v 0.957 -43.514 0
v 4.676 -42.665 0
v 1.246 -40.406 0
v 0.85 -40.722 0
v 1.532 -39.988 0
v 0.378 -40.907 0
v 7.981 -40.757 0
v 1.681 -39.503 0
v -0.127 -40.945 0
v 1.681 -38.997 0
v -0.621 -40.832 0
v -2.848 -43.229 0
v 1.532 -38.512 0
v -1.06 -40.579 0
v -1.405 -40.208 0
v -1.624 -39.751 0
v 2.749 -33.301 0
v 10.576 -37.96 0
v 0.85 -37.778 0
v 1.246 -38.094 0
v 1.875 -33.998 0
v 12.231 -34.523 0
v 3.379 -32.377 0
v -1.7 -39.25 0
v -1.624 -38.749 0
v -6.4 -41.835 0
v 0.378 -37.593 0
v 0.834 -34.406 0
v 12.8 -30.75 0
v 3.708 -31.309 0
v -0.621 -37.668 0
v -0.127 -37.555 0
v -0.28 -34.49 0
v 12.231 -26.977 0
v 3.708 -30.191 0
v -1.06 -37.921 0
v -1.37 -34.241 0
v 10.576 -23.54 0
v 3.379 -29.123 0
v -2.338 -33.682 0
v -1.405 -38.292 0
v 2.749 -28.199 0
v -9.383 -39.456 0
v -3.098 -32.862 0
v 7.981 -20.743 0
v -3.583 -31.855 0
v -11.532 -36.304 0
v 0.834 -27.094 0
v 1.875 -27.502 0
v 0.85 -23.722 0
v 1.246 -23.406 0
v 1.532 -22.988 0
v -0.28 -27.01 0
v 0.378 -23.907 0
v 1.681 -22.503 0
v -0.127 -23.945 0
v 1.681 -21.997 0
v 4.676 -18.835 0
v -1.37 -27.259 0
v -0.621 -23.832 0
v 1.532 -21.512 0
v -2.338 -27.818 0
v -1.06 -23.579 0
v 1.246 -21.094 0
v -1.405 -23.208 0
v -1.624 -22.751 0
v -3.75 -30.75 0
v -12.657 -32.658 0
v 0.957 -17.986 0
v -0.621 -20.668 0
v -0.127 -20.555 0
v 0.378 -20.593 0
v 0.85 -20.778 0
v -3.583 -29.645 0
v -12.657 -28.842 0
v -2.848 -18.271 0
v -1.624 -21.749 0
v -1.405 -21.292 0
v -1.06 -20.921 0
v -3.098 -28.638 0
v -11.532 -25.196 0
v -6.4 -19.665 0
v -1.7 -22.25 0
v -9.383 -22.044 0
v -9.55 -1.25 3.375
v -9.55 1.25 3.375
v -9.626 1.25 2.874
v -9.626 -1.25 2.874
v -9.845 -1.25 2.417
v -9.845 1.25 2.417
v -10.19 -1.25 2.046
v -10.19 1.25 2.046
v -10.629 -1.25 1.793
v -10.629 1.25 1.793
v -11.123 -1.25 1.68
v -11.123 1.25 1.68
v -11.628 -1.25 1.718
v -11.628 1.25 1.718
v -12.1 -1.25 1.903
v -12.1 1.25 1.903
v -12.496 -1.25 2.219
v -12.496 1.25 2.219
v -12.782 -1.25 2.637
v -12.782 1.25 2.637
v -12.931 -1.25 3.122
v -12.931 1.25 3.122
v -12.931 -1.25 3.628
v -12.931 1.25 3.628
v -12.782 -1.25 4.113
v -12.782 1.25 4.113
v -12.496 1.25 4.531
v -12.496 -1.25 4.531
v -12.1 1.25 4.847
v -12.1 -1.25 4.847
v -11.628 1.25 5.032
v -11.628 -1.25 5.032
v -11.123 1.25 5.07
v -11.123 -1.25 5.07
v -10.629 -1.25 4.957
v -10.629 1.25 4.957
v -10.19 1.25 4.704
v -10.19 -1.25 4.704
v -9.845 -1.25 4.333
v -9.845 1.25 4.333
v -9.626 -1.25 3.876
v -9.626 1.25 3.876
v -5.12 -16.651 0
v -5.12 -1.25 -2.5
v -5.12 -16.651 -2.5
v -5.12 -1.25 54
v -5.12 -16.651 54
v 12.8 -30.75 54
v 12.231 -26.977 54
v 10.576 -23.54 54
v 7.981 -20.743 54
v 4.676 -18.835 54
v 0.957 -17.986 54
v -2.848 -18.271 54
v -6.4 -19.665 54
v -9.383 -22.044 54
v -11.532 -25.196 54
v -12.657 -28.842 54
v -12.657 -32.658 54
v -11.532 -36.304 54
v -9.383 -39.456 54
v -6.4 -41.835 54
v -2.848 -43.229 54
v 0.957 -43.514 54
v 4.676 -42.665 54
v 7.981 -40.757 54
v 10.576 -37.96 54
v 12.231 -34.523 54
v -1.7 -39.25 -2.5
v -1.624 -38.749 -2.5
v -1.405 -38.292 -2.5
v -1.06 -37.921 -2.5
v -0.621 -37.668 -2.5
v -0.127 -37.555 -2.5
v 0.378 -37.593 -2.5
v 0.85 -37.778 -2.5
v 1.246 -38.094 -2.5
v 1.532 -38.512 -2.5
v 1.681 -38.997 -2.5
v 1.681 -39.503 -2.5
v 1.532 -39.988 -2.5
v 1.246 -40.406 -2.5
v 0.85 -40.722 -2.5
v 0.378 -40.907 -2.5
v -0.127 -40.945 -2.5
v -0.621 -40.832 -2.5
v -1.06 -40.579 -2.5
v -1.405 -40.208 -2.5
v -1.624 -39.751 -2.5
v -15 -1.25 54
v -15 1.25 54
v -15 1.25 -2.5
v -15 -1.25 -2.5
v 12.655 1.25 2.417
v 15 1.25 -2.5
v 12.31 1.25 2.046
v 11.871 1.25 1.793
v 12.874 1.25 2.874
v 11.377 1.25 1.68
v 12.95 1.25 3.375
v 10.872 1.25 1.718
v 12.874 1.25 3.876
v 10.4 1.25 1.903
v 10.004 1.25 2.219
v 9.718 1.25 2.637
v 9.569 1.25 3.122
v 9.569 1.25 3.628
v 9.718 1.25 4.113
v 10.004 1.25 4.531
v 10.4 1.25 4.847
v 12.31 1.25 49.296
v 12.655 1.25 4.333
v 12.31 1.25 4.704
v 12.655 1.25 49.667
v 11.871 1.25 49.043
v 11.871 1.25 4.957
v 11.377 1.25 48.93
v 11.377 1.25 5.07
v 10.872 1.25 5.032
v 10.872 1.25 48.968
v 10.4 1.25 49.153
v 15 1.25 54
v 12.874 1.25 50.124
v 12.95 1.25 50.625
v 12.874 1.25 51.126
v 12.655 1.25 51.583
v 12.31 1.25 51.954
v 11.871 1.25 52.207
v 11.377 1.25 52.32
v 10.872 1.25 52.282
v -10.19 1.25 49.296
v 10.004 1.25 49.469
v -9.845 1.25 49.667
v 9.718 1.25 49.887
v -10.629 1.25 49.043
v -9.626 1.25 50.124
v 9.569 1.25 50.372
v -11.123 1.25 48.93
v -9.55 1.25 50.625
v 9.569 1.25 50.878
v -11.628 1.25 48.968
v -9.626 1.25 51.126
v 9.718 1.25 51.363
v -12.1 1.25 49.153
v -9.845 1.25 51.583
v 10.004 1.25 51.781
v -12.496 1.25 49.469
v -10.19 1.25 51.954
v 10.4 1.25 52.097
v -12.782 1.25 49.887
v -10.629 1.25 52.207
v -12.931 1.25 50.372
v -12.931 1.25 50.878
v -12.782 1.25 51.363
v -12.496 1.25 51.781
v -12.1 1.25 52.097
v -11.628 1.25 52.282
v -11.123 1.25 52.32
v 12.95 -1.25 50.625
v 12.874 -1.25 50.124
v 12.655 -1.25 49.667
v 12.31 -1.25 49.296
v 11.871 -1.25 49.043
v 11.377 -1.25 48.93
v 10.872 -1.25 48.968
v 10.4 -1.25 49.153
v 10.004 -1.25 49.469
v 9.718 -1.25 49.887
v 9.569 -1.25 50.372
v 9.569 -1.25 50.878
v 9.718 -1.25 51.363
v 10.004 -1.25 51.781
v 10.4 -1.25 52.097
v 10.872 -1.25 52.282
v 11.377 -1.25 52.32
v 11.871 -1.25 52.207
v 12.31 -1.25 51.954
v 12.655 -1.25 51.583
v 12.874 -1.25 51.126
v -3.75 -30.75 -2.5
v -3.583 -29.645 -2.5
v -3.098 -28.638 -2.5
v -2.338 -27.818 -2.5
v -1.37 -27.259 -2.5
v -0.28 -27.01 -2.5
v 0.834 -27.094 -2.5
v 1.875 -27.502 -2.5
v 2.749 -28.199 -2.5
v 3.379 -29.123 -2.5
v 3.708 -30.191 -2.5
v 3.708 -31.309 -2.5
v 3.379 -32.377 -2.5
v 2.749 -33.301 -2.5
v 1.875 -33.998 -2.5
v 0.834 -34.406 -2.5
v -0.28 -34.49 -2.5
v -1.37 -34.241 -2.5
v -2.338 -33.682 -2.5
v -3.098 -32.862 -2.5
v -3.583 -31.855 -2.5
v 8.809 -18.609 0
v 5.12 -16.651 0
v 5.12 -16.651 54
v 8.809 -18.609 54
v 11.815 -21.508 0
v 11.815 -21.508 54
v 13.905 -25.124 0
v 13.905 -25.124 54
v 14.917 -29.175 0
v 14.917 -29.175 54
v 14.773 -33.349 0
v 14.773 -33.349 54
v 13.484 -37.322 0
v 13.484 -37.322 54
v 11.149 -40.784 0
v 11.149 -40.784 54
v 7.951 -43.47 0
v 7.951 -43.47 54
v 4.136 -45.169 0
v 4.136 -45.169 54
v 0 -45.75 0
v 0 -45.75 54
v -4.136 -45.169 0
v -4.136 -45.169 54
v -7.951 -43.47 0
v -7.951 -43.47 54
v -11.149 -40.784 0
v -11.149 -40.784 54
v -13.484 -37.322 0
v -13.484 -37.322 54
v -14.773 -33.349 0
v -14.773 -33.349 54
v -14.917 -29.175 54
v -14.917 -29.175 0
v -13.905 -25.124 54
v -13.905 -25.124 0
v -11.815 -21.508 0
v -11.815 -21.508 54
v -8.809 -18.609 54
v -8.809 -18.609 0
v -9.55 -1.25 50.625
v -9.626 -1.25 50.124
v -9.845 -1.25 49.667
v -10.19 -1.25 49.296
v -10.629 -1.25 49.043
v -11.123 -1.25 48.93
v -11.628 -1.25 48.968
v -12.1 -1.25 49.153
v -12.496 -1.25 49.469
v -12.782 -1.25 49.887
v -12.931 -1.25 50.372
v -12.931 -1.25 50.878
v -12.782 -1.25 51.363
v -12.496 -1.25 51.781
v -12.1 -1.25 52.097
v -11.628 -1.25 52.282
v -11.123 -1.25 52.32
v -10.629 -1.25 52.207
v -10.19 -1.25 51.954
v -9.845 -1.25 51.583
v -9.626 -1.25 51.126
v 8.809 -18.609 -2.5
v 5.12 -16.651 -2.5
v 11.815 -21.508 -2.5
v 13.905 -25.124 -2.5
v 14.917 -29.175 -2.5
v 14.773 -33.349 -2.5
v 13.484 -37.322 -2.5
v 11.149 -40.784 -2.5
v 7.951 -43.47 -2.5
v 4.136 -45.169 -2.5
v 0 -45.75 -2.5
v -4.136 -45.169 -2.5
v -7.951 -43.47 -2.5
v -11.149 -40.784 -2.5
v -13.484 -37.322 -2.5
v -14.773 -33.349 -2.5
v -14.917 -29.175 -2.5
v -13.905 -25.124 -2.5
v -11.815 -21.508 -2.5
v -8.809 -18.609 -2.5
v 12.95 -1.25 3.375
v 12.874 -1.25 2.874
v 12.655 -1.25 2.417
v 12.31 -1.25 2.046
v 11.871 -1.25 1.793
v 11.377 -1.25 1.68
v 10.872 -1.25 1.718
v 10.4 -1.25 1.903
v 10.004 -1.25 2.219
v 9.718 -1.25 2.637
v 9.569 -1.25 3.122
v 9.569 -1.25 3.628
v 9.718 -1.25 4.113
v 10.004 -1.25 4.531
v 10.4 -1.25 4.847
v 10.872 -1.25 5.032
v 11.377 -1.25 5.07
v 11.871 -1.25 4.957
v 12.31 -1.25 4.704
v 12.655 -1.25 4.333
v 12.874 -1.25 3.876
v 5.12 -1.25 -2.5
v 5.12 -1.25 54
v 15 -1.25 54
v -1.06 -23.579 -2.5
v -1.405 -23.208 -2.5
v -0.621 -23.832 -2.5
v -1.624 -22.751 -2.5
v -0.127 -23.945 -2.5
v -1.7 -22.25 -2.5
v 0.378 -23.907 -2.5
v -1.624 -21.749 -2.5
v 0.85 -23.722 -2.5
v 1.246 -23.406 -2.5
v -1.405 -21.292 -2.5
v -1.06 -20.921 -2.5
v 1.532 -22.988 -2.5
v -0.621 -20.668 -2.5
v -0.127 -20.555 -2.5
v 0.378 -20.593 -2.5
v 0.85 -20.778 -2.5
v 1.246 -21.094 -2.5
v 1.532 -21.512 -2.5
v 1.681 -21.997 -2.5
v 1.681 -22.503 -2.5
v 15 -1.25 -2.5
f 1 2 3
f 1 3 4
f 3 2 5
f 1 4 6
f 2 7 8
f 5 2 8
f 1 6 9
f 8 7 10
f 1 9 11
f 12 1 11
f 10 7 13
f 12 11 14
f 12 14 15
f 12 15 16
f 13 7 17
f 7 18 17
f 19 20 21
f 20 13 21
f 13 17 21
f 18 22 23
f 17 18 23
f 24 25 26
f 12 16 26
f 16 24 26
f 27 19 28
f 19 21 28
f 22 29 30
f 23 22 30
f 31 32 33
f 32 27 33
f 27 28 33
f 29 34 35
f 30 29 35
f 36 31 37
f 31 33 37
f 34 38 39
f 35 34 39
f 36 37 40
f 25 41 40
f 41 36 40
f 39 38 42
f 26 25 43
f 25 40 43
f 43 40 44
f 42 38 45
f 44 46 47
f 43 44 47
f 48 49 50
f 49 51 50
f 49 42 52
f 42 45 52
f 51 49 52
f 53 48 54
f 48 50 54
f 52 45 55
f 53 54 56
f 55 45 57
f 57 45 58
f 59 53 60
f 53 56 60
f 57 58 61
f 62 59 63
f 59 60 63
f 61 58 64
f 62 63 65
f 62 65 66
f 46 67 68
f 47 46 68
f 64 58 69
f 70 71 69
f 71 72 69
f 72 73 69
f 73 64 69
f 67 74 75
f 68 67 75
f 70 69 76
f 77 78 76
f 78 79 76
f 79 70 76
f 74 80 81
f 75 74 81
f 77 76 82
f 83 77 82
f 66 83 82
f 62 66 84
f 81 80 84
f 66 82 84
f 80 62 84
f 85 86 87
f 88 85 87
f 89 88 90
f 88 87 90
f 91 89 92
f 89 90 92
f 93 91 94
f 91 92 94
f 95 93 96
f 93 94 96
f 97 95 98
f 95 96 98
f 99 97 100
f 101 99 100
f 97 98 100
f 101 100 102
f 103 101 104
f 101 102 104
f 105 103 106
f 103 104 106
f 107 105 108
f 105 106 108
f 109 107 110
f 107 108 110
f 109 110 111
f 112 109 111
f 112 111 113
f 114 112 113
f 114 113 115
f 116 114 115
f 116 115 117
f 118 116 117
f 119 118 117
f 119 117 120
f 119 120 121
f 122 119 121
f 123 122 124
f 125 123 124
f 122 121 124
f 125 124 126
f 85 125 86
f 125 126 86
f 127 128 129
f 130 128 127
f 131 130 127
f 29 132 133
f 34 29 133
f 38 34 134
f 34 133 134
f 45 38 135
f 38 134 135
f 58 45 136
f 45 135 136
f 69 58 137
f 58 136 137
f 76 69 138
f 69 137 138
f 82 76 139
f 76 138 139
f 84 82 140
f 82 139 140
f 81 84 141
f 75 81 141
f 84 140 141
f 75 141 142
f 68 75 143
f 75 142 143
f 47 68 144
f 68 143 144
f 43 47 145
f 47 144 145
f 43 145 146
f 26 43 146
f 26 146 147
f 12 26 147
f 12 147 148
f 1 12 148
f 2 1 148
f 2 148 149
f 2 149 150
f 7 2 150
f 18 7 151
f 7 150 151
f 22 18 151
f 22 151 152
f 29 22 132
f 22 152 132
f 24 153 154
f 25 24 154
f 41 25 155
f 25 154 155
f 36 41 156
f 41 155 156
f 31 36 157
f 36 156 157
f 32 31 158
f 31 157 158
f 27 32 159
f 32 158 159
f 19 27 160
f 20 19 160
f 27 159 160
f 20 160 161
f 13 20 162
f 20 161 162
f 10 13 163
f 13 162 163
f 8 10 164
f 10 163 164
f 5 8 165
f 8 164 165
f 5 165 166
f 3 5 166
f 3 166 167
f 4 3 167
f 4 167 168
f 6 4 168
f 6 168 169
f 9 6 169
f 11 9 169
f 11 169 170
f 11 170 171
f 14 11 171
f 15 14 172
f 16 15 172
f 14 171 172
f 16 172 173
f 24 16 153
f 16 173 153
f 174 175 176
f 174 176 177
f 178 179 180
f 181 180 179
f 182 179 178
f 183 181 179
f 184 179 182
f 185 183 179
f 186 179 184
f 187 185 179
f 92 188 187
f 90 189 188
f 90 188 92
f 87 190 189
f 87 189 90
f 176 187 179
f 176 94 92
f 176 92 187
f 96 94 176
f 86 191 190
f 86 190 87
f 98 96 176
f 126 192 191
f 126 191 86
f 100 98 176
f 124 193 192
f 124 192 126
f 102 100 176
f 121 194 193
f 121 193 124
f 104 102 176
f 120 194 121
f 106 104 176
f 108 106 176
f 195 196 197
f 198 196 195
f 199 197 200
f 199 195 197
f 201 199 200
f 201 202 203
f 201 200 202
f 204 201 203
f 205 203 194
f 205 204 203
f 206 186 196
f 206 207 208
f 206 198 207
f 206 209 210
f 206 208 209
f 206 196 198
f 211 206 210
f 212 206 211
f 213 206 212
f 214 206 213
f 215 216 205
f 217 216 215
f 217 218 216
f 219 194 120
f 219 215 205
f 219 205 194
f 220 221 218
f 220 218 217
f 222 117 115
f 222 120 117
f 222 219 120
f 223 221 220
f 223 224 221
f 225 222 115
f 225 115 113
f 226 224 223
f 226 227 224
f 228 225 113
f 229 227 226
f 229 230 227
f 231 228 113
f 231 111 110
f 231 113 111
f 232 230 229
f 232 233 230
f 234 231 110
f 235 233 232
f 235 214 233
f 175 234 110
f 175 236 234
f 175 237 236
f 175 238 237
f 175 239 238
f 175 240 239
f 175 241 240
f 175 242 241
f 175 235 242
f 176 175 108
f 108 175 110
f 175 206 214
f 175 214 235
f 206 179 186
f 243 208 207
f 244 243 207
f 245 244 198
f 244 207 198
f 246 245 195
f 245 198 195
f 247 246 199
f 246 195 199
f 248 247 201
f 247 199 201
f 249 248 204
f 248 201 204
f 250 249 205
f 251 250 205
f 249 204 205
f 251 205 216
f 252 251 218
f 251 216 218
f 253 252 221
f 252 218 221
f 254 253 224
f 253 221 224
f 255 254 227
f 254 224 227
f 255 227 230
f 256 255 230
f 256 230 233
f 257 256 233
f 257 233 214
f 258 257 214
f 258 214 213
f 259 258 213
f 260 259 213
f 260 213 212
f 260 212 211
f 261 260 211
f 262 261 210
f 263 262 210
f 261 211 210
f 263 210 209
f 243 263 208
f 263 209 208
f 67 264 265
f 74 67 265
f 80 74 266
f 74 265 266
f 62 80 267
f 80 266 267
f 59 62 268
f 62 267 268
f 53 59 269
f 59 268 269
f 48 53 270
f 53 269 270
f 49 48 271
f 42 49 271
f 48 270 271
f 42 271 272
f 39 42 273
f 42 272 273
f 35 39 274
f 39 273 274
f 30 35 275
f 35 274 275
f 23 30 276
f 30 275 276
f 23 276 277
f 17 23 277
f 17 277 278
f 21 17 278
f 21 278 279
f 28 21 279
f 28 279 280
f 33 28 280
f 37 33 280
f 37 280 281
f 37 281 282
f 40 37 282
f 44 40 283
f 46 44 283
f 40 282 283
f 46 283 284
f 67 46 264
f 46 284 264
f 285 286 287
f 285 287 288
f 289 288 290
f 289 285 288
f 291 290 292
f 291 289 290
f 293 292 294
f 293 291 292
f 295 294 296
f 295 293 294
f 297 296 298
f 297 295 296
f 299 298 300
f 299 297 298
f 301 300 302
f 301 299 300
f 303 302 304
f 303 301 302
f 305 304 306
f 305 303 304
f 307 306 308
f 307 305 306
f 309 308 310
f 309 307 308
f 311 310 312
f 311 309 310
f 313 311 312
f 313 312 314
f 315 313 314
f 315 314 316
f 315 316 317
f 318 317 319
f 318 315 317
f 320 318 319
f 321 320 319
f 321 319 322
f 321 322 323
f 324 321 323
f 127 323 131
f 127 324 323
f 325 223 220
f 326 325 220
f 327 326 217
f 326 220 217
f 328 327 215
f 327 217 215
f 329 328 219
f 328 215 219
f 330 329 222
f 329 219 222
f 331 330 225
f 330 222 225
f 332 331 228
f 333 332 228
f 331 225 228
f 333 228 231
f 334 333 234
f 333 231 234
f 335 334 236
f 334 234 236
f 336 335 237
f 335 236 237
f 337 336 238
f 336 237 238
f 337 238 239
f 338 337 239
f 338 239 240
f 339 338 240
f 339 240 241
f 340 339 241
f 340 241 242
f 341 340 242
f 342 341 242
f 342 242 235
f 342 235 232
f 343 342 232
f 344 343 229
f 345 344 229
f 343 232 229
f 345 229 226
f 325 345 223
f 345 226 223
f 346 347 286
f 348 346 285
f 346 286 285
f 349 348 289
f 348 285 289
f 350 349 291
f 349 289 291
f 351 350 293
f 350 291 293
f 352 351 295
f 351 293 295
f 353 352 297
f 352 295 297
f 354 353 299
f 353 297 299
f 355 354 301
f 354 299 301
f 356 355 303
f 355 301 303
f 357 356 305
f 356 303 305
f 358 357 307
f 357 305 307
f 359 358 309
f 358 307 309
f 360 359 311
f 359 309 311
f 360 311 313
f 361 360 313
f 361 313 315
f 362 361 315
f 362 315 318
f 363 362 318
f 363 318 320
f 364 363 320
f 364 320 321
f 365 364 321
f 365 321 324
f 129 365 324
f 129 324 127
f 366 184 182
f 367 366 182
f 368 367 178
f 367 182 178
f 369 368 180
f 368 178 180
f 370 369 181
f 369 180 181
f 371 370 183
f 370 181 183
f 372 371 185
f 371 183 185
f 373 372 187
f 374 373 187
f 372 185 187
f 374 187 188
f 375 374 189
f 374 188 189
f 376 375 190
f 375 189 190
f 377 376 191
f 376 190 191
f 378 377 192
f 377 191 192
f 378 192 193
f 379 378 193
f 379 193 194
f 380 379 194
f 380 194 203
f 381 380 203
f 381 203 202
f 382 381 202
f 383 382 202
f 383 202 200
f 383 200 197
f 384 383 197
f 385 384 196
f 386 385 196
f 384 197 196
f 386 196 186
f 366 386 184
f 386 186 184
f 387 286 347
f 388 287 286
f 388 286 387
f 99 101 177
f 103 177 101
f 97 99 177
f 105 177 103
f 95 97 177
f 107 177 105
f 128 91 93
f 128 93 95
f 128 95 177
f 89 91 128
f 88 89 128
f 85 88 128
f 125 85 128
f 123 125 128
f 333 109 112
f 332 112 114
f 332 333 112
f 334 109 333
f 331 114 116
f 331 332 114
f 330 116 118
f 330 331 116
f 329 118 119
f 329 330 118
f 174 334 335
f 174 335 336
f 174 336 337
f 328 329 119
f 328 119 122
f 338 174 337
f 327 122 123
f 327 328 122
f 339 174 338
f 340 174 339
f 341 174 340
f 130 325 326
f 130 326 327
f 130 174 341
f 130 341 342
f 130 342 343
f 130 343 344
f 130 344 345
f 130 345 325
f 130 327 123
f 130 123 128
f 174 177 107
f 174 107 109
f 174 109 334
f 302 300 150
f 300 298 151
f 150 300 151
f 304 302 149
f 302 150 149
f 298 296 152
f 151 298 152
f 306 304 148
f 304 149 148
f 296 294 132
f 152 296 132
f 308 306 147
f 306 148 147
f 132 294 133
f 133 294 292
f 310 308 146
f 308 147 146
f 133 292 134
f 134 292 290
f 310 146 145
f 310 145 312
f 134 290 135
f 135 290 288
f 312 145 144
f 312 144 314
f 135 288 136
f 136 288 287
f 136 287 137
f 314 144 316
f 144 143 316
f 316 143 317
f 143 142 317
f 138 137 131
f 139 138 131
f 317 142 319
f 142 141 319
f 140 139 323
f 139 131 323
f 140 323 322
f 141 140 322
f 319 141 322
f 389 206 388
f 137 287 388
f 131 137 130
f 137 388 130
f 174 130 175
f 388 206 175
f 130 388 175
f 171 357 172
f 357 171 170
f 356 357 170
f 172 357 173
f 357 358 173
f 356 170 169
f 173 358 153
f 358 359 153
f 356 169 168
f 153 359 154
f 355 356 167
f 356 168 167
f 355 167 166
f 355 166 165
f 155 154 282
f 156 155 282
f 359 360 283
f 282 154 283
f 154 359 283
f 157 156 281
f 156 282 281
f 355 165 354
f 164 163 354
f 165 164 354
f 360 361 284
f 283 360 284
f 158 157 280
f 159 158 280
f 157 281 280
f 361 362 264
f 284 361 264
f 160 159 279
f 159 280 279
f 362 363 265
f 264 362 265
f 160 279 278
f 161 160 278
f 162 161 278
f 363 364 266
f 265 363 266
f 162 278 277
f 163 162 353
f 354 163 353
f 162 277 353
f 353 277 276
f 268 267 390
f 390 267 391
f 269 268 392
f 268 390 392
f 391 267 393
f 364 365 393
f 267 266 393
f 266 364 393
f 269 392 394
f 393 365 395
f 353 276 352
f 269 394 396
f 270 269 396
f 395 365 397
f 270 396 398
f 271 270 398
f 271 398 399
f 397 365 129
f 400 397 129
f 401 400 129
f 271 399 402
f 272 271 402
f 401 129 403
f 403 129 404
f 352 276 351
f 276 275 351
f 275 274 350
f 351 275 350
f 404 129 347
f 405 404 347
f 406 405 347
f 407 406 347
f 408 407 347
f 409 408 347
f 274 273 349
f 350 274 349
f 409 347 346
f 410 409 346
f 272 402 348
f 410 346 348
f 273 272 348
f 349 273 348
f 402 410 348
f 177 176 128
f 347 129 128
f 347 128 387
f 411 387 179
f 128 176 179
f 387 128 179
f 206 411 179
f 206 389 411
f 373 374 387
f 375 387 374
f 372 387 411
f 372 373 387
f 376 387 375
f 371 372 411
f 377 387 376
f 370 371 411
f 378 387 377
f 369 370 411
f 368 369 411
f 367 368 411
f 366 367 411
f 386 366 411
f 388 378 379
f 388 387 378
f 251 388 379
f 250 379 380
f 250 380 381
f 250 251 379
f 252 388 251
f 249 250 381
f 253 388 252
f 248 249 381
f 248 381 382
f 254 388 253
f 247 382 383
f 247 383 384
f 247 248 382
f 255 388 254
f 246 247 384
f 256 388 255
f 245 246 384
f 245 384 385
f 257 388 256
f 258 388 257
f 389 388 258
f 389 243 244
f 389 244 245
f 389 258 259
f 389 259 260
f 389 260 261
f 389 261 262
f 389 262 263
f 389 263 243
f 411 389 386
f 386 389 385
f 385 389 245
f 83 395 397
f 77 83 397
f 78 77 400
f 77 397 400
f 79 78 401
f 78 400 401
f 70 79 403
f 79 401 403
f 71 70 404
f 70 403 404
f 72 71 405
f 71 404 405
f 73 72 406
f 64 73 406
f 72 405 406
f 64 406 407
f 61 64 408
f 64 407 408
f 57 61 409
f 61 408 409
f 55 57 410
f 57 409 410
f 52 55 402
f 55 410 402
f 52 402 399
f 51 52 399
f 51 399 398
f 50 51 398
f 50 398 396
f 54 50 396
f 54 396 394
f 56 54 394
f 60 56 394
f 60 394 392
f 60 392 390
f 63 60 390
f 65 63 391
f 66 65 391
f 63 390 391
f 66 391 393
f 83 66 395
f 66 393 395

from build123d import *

# Parameters (mm, degrees)
CROQUIS1_R              = 12.5
SALIENTE_EXTRUIR1_DEPTH = 54
CROQUIS2_R              = 15
SALIENTE_EXTRUIR2_DEPTH = 2.5
CROQUIS3_R              = 3.75
CORTAR_EXTRUIR2_DEPTH   = 2.5
CROQUIS5_R              = 1.5
CORTAR_EXTRUIR3_DEPTH   = 2.5
CROQUIS9_R              = 1.5
CORTAR_EXTRUIR5_DEPTH   = 2.5
SALIENTE_EXTRUIR3_DEPTH = 2.5
CROQUIS11_R             = 12.8
CORTAR_EXTRUIR6_DEPTH   = 54
CROQUIS12_R             = 1.7
CORTAR_EXTRUIR7_DEPTH   = 2.5
CROQUIS16_R             = 1.7
CORTAR_EXTRUIR8_DEPTH   = 2.5
CROQUIS17_R             = 1.7
CORTAR_EXTRUIR9_DEPTH   = 2.5


with BuildPart() as part:
    # Croquis1 → Saliente-Extruir1 (new body)
    with BuildSketch(Plane.XY):
        with BuildLine():
            Line((-5.119897429, -1.25), (-15, -1.25))
            Line((-15, -1.25), (-15, 1.25))
            Line((-15, 1.25), (15, 1.25))
            Line((15, 1.25), (15, -1.25))
            Line((15, -1.25), (5.119897429, -1.25))
            Line((5.119897429, -1.25), (5.119897429, -13.25))
            Line((5.119897429, -13.25), (5.119897429, -16.650828027))
            ThreePointArc((5.119897429, -16.650828027), (0, -45.75), (-5.119897429, -16.650828027))
            Line((-5.119897429, -16.650828027), (-5.119897429, -13.25))
            Line((-5.119897429, -13.25), (-5.119897429, -1.25))
        make_face()
        with Locations((0, -30.75)):
            Circle(CROQUIS1_R, mode=Mode.SUBTRACT)
    extrude(amount=SALIENTE_EXTRUIR1_DEPTH)

    # Croquis2 → Saliente-Extruir2 (add)
    with BuildSketch(Plane(origin=(0, 0, 0), x_dir=(-1, 0, 0), z_dir=(0, 0, -1))):
        with Locations((0, -30.75)):
            Circle(CROQUIS2_R)
    extrude(amount=SALIENTE_EXTRUIR2_DEPTH)

    # Croquis3 → Cortar-Extruir2 (cut)
    with BuildSketch(Plane(origin=(0, 0, -2.5), x_dir=(-1, 0, 0), z_dir=(0, 0, -1))):
        with Locations((0, -30.75)):
            Circle(CROQUIS3_R)
    extrude(amount=-CORTAR_EXTRUIR2_DEPTH, mode=Mode.SUBTRACT)

    # Croquis5 → Cortar-Extruir3 (cut)
    with BuildSketch(Plane(origin=(0, 0, -2.5), x_dir=(-1, 0, 0), z_dir=(0, 0, -1))):
        with Locations((0, -22.25)):
            Circle(CROQUIS5_R)
        with Locations((0, -39.25)):
            Circle(CROQUIS5_R)
    extrude(amount=-CORTAR_EXTRUIR3_DEPTH, mode=Mode.SUBTRACT)

    # Croquis9 → Cortar-Extruir5 (cut)
    with BuildSketch(Plane(origin=(0, 1.25, 0), x_dir=(1, 0, 0), z_dir=(0, 1, 0))):
        with Locations((-11.25, -50.625)):
            Circle(CROQUIS9_R)
        with Locations((-11.25, -3.375)):
            Circle(CROQUIS9_R)
        with Locations((11.25, -50.625)):
            Circle(CROQUIS9_R)
        with Locations((11.25, -3.375)):
            Circle(CROQUIS9_R)
    extrude(amount=-CORTAR_EXTRUIR5_DEPTH, mode=Mode.SUBTRACT)

    # Croquis10 → Saliente-Extruir3 (add)
    with BuildSketch(Plane(origin=(0, 0, 0), x_dir=(-1, 0, 0), z_dir=(0, 0, -1))):
        with BuildLine():
            Line((-15, 1.25), (15, 1.25))
            Line((15, 1.25), (15, -1.25))
            Line((15, -1.25), (5.119897429, -1.25))
            Line((5.119897429, -1.25), (5.119897429, -16.650828027))
            ThreePointArc((5.119897429, -16.650828027), (0, -15.75), (-5.119897429, -16.650828027))
            Line((-5.119897429, -16.650828027), (-5.119897429, -1.25))
            Line((-5.119897429, -1.25), (-15, -1.25))
            Line((-15, -1.25), (-15, 1.25))
        make_face()
    extrude(amount=SALIENTE_EXTRUIR3_DEPTH)

    # Croquis11 → Cortar-Extruir6 (cut)
    with BuildSketch(Plane.XY.offset(54)):
        with Locations((0, -30.75)):
            Circle(CROQUIS11_R)
    extrude(amount=-CORTAR_EXTRUIR6_DEPTH, mode=Mode.SUBTRACT)

    # Croquis12 → Cortar-Extruir7 (cut)
    with BuildSketch(Plane(origin=(0, 0, -2.5), x_dir=(-1, 0, 0), z_dir=(0, 0, -1))):
        with Locations((0, -22.25)):
            Circle(CROQUIS12_R)
        with Locations((0, -39.25)):
            Circle(CROQUIS12_R)
    extrude(amount=-CORTAR_EXTRUIR7_DEPTH, mode=Mode.SUBTRACT)

    # Croquis16 → Cortar-Extruir8 (cut)
    with BuildSketch(Plane(origin=(0, 1.25, 0), x_dir=(1, 0, 0), z_dir=(0, 1, 0))):
        with Locations((-11.25, -3.375)):
            Circle(CROQUIS16_R)
    extrude(amount=-CORTAR_EXTRUIR8_DEPTH, mode=Mode.SUBTRACT)

    # Croquis17 → Cortar-Extruir9 (cut)
    with BuildSketch(Plane(origin=(0, 1.25, 0), x_dir=(1, 0, 0), z_dir=(0, 1, 0))):
        with Locations((-11.25, -3.375)):
            Circle(CROQUIS17_R)
        with Locations((11.25, -3.375)):
            Circle(CROQUIS17_R)
        with Locations((-11.25, -50.625)):
            Circle(CROQUIS17_R)
        with Locations((11.25, -50.625)):
            Circle(CROQUIS17_R)
    extrude(amount=-CORTAR_EXTRUIR9_DEPTH, mode=Mode.SUBTRACT)


solid = part.part
